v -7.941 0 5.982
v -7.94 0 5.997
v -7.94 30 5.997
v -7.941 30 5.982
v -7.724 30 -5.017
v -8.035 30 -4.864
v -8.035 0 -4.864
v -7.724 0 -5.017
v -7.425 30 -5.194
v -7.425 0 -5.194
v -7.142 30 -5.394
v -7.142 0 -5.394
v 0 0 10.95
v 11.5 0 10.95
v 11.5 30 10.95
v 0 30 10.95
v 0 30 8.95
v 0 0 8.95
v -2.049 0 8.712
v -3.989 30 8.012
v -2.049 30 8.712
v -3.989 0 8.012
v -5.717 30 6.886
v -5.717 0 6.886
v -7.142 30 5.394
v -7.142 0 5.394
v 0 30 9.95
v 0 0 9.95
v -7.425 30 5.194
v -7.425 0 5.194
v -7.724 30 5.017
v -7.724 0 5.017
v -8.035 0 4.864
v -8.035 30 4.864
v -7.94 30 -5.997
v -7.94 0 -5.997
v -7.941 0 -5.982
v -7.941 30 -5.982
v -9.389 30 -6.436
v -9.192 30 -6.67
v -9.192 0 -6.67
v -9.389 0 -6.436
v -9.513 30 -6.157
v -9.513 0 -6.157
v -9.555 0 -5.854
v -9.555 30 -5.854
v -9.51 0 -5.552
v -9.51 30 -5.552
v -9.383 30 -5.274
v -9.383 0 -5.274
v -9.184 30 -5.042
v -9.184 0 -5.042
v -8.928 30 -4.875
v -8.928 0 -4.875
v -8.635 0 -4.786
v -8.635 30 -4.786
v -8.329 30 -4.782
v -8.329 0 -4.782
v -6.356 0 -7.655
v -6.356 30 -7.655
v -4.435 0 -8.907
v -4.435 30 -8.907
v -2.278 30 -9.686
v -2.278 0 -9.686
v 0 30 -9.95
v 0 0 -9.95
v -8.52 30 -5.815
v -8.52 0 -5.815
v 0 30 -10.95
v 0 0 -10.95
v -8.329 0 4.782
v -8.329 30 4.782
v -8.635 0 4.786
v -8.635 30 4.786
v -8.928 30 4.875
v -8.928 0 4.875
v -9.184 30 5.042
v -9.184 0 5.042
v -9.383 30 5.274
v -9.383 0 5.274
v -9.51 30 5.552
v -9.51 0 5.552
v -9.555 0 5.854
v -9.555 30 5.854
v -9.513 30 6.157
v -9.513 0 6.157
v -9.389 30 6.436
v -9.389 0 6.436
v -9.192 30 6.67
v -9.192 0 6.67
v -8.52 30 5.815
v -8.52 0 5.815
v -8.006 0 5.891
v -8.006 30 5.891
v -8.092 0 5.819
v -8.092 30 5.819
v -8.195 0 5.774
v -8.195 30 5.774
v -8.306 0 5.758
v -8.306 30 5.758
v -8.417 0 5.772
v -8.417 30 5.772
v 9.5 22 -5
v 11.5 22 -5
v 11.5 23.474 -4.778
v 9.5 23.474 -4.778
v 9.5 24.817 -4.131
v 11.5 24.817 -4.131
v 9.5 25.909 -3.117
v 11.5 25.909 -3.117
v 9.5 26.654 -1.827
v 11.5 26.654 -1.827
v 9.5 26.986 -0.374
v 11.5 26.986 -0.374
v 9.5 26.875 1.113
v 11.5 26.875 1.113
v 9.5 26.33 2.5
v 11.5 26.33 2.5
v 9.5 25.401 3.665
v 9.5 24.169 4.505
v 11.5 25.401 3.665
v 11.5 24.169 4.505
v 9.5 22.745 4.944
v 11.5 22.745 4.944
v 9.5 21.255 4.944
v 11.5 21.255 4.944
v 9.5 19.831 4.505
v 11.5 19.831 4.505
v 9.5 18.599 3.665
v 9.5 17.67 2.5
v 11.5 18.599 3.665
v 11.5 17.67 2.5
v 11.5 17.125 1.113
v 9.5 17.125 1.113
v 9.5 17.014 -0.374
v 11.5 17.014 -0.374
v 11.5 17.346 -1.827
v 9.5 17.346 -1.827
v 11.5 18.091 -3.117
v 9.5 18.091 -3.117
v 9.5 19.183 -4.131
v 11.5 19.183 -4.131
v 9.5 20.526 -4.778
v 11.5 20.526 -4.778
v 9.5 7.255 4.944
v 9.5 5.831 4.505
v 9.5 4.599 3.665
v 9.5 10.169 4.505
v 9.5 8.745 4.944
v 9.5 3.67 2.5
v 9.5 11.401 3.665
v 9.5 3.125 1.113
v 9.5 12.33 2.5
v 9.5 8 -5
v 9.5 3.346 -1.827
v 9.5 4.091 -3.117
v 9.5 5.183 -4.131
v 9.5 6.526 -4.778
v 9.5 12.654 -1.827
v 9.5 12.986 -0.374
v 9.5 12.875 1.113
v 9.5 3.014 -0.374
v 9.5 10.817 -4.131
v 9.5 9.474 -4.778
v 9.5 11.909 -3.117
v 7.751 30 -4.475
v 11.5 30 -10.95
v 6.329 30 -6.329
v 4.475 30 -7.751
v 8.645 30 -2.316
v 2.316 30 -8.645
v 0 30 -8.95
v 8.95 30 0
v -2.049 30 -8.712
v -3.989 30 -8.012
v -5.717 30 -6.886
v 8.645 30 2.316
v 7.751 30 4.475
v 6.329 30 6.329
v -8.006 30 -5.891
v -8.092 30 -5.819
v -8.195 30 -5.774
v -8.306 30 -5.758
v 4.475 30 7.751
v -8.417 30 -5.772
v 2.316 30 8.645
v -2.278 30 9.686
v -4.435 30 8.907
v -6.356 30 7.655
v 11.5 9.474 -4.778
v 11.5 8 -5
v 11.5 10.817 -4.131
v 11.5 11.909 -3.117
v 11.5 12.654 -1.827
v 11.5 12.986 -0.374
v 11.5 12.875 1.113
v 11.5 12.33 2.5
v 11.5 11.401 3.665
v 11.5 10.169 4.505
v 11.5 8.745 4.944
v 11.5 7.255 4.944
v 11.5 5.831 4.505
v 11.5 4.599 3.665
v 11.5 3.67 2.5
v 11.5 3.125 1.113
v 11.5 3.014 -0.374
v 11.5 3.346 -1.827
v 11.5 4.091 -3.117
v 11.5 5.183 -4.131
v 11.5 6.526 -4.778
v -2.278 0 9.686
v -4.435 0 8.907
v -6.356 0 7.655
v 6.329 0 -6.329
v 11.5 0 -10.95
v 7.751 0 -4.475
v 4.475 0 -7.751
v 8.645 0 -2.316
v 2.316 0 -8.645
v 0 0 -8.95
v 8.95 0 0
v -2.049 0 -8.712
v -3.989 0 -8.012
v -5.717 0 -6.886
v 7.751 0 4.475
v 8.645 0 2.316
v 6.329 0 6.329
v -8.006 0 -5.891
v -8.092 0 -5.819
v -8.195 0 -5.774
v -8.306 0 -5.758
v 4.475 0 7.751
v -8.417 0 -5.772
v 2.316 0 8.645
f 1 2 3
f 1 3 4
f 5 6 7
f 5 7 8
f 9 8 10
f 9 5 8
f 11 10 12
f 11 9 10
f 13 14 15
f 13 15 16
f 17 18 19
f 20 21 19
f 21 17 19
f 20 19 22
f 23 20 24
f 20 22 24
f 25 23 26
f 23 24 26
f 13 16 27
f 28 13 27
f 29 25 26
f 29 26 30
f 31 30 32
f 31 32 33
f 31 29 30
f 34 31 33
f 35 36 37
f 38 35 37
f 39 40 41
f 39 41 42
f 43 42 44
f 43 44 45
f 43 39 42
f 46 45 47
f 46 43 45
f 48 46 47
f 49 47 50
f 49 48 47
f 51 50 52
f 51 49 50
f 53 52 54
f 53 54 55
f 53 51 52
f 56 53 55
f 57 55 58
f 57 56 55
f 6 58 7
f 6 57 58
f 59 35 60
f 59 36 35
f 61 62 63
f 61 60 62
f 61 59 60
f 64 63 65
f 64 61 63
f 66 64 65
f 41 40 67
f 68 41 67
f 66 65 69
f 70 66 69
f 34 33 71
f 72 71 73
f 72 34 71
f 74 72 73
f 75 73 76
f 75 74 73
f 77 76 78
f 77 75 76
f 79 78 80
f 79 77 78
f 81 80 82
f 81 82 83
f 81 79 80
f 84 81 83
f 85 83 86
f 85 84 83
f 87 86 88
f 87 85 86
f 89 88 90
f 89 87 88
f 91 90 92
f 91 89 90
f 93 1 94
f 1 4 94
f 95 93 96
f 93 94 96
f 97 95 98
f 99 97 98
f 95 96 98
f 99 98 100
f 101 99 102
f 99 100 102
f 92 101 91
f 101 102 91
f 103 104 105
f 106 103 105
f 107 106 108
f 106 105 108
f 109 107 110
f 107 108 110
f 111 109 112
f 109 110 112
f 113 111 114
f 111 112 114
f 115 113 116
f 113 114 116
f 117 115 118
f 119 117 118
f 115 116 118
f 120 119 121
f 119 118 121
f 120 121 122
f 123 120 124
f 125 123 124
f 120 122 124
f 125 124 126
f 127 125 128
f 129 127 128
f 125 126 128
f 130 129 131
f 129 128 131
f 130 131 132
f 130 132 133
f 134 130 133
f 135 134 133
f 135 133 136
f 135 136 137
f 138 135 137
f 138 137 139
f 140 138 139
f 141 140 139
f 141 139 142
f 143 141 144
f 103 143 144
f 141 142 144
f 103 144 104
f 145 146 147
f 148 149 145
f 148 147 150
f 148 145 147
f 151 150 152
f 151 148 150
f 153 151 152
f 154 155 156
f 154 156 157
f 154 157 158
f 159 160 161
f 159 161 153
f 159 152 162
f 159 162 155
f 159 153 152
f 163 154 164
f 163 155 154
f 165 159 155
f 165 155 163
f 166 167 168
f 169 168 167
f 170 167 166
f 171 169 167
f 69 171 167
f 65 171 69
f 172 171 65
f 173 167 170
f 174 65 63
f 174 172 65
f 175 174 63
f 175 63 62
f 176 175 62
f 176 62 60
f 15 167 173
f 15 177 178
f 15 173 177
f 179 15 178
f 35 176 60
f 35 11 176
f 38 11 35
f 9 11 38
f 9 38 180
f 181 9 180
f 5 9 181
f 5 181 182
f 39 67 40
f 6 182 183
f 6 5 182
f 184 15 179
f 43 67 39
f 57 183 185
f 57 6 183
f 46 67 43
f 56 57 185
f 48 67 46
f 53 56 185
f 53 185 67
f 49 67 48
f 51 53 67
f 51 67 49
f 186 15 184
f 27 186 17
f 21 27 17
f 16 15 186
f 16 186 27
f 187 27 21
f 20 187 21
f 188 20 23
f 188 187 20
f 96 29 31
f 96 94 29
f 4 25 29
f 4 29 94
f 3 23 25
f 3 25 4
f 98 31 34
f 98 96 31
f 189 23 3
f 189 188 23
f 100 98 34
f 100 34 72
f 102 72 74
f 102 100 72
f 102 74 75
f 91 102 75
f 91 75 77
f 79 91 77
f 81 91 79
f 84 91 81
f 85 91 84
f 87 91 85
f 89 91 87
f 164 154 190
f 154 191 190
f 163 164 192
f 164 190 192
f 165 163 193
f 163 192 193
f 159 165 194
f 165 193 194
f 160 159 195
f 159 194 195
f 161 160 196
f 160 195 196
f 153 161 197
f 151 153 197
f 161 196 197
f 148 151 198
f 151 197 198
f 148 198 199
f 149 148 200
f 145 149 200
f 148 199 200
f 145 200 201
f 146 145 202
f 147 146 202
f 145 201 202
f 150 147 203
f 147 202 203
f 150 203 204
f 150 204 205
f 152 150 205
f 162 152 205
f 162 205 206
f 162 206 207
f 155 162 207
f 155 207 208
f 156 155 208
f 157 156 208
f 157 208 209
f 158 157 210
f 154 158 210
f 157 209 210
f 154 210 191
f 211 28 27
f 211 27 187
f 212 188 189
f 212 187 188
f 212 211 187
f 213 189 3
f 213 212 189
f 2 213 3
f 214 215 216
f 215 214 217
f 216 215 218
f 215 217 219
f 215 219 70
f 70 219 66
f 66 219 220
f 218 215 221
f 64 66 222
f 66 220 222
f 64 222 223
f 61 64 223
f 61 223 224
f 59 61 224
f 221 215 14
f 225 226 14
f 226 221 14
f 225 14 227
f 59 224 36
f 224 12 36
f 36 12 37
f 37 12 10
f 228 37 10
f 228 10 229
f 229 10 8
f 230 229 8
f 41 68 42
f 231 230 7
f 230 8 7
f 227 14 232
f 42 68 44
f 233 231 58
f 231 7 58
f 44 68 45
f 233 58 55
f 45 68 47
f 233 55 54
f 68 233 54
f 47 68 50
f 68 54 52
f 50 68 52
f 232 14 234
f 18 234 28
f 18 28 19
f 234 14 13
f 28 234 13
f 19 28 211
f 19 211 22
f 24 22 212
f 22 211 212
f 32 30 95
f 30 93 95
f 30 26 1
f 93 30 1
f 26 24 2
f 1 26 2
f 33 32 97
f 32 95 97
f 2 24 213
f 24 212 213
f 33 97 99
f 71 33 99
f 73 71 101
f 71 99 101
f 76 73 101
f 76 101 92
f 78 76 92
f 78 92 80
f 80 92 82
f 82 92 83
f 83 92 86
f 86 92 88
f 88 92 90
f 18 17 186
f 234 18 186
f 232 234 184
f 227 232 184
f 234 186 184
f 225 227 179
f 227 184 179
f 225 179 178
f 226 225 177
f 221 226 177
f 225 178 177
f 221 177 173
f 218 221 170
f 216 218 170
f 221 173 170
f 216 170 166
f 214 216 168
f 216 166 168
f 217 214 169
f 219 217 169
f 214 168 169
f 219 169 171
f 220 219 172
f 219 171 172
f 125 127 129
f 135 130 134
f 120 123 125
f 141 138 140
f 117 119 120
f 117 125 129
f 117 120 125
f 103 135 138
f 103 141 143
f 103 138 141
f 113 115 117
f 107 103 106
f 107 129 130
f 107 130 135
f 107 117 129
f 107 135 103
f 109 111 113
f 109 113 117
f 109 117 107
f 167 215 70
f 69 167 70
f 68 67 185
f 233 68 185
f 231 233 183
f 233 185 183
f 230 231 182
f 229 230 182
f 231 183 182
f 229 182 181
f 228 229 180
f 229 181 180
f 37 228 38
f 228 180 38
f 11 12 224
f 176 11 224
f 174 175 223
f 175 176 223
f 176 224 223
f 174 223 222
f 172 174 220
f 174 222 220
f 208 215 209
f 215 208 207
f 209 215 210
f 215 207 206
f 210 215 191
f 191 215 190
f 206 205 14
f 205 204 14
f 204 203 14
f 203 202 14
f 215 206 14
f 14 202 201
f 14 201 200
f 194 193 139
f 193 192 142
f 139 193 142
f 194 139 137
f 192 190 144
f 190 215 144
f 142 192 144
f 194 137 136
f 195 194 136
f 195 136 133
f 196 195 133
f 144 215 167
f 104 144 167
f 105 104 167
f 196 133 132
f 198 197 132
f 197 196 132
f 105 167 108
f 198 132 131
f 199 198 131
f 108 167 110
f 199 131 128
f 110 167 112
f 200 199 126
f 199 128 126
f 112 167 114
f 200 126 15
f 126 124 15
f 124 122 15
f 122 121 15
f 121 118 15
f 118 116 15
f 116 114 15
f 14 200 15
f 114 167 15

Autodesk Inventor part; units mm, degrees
ref_plane "YZ Plane" through (0, 0, 0) normal (1, 0, 0) x (0, 1, 0)
ref_plane "XZ Plane" through (0, 0, 0) normal (0, 1, 0) x (-1, 0, 0)
ref_plane "XY Plane" through (0, 0, 0) normal (0, 0, 1) x (1, 0, 0)
sketch "Эскиз1" plane through (0, 0, 0) normal (0, 1, 0) x (-1, 0, 0)
  circle A0 centre (0, 0) radius 8.95
  circle A1 centre (0, 0) radius 9.95
  line L0 (0, 0) -> (7.9399, 5.9967)
  line L1 (0, 0) -> (7.9399, -5.9967)
  point P0 (7.1419, -5.394)
  point P1 (7.1419, 5.394)
  dimension "d0" = 17.9
  dimension "d1" = 19.9
extrude "Выдавливание1" add sketch "Эскиз1" along normal blind 30 contours A0 L1 A1 L0 picked at (-8.7459, -3.8334)
sketch "Эскиз2" plane through (0, 30, 0) normal (0, 1, 0) x (1, 0, 0)
  arc A0 (-7.1419, -5.394) -> (-8.0346, -4.8641) centre (-9.8432, -8.9279) ccw
  arc A1 (-8.0346, -4.8641) -> (-9.1915, -6.6699) centre (-8.4689, -5.8593) ccw
  line L0 (-9.1915, -6.6699) -> (-8.5202, -5.8154)
  arc A2 (-7.9413, -5.9822) -> (-8.5202, -5.8154) centre (-8.3096, -6.1726) ccw
  line L1 (-7.1419, -5.394) -> (-7.9399, -5.9967)
  line L2 (-7.9399, -5.9967) -> (-7.1419, -5.394)
  line L3 (-7.9399, -5.9967) -> (-7.9413, -5.9822)
  line L4 (-0.0151, 0) -> (-3.489, 0)
  arc A3 (-8.0346, 4.8641) -> (-7.1419, 5.394) centre (-9.8432, 8.9279) ccw
  arc A4 (-8.5202, 5.8154) -> (-7.9413, 5.9822) centre (-8.3096, 6.1726) ccw
  line L5 (-7.1419, 5.394) -> (-7.9399, 5.9967)
  line L6 (-7.9399, 5.9967) -> (-7.1419, 5.394)
  line L7 (-7.9399, 5.9967) -> (-7.9413, 5.9822)
  arc A5 (-9.1915, 6.6699) -> (-8.0346, 4.8641) centre (-8.4689, 5.8593) ccw
  line L8 (-9.1915, 6.6699) -> (-8.5202, 5.8154)
  point P0 (-7.1419, 5.394)
  point P1 (-7.9399, -5.9967)
  point P2 (-5.3694, -4.0591)
  point P3 (-7.9399, 5.9967)
  point P4 (-5.3694, 4.0591)
  point P5 (-7.9399, 5.9967)
  dimension "d25" = 1.0859
sketch "Эскиз3" plane through (0, 30, 0) normal (0, 1, 0) x (1, 0, 0)
  arc A0 (-7.9399, -5.9967) -> (-7.9399, 5.9967) centre (0, 0) ccw projected
  line L0 (11.5, -6.95) -> (11.5, 6.95)
  arc A1 (-7.1419, -5.394) -> (-7.1419, 5.394) centre (0, 0) ccw projected
  arc A2 (0, -8.95) -> (0, 8.95) centre (0, 0) ccw
  line L1 (0, -9.95) -> (0, -8.95)
  line L2 (0, 8.95) -> (0, 9.95)
  line L3 (11.5, 6.95) -> (11.5, 10.95)
  line L4 (11.5, -6.95) -> (11.5, -10.95)
  line L5 (0, 5.45) -> (0, 9.95)
  line L6 (11.5, -10.95) -> (0, -10.95)
  line L7 (0, -10.95) -> (0, -9.95)
  line L8 (11.5, 10.95) -> (0, 10.95)
  line L9 (0, 10.95) -> (0, 9.95)
  point P0 (0, 8.95)
  dimension "d13" = 4
  dimension "d14" = 4
  dimension "d22" = 21.9
  dimension "d23" = 2
extrude "Выдавливание3" add sketch "Эскиз3" against normal blind 30
ref_plane "РабПлоскость1" through (11.5, 20, 4.95) normal (1, 0, 0) x (0, 0, -1)
sketch "Эскиз4" plane through (11.5, 20, 4.95) normal (1, 0, 0) x (0, 0, -1)
  line L0 (4.95, -20) -> (4.95, 10)
  line L1 (1, 10) -> (8.9, 10) projected
  circle A0 centre (4.95, -12) radius 5
  line L2 (14.4, -20) -> (-4.5, -20) projected
  circle A1 centre (4.95, 2) radius 5
  line L3 (-4.5, 10) -> (14.4, 10) projected
  point P0 (7.3306, 10)
  point P1 (2.5694, 10)
  point P2 (4.95, 10)
  dimension "d15" = 10
  dimension "d16" = 8
  dimension "d17" = 10
  dimension "d18" = 8
extrude "Выдавливание4" cut sketch "Эскиз4" against normal blind 2
extrude "Выдавливание5" add sketch "Эскиз2" against normal blind 30
properties part number "крепление маркера 18мм"
